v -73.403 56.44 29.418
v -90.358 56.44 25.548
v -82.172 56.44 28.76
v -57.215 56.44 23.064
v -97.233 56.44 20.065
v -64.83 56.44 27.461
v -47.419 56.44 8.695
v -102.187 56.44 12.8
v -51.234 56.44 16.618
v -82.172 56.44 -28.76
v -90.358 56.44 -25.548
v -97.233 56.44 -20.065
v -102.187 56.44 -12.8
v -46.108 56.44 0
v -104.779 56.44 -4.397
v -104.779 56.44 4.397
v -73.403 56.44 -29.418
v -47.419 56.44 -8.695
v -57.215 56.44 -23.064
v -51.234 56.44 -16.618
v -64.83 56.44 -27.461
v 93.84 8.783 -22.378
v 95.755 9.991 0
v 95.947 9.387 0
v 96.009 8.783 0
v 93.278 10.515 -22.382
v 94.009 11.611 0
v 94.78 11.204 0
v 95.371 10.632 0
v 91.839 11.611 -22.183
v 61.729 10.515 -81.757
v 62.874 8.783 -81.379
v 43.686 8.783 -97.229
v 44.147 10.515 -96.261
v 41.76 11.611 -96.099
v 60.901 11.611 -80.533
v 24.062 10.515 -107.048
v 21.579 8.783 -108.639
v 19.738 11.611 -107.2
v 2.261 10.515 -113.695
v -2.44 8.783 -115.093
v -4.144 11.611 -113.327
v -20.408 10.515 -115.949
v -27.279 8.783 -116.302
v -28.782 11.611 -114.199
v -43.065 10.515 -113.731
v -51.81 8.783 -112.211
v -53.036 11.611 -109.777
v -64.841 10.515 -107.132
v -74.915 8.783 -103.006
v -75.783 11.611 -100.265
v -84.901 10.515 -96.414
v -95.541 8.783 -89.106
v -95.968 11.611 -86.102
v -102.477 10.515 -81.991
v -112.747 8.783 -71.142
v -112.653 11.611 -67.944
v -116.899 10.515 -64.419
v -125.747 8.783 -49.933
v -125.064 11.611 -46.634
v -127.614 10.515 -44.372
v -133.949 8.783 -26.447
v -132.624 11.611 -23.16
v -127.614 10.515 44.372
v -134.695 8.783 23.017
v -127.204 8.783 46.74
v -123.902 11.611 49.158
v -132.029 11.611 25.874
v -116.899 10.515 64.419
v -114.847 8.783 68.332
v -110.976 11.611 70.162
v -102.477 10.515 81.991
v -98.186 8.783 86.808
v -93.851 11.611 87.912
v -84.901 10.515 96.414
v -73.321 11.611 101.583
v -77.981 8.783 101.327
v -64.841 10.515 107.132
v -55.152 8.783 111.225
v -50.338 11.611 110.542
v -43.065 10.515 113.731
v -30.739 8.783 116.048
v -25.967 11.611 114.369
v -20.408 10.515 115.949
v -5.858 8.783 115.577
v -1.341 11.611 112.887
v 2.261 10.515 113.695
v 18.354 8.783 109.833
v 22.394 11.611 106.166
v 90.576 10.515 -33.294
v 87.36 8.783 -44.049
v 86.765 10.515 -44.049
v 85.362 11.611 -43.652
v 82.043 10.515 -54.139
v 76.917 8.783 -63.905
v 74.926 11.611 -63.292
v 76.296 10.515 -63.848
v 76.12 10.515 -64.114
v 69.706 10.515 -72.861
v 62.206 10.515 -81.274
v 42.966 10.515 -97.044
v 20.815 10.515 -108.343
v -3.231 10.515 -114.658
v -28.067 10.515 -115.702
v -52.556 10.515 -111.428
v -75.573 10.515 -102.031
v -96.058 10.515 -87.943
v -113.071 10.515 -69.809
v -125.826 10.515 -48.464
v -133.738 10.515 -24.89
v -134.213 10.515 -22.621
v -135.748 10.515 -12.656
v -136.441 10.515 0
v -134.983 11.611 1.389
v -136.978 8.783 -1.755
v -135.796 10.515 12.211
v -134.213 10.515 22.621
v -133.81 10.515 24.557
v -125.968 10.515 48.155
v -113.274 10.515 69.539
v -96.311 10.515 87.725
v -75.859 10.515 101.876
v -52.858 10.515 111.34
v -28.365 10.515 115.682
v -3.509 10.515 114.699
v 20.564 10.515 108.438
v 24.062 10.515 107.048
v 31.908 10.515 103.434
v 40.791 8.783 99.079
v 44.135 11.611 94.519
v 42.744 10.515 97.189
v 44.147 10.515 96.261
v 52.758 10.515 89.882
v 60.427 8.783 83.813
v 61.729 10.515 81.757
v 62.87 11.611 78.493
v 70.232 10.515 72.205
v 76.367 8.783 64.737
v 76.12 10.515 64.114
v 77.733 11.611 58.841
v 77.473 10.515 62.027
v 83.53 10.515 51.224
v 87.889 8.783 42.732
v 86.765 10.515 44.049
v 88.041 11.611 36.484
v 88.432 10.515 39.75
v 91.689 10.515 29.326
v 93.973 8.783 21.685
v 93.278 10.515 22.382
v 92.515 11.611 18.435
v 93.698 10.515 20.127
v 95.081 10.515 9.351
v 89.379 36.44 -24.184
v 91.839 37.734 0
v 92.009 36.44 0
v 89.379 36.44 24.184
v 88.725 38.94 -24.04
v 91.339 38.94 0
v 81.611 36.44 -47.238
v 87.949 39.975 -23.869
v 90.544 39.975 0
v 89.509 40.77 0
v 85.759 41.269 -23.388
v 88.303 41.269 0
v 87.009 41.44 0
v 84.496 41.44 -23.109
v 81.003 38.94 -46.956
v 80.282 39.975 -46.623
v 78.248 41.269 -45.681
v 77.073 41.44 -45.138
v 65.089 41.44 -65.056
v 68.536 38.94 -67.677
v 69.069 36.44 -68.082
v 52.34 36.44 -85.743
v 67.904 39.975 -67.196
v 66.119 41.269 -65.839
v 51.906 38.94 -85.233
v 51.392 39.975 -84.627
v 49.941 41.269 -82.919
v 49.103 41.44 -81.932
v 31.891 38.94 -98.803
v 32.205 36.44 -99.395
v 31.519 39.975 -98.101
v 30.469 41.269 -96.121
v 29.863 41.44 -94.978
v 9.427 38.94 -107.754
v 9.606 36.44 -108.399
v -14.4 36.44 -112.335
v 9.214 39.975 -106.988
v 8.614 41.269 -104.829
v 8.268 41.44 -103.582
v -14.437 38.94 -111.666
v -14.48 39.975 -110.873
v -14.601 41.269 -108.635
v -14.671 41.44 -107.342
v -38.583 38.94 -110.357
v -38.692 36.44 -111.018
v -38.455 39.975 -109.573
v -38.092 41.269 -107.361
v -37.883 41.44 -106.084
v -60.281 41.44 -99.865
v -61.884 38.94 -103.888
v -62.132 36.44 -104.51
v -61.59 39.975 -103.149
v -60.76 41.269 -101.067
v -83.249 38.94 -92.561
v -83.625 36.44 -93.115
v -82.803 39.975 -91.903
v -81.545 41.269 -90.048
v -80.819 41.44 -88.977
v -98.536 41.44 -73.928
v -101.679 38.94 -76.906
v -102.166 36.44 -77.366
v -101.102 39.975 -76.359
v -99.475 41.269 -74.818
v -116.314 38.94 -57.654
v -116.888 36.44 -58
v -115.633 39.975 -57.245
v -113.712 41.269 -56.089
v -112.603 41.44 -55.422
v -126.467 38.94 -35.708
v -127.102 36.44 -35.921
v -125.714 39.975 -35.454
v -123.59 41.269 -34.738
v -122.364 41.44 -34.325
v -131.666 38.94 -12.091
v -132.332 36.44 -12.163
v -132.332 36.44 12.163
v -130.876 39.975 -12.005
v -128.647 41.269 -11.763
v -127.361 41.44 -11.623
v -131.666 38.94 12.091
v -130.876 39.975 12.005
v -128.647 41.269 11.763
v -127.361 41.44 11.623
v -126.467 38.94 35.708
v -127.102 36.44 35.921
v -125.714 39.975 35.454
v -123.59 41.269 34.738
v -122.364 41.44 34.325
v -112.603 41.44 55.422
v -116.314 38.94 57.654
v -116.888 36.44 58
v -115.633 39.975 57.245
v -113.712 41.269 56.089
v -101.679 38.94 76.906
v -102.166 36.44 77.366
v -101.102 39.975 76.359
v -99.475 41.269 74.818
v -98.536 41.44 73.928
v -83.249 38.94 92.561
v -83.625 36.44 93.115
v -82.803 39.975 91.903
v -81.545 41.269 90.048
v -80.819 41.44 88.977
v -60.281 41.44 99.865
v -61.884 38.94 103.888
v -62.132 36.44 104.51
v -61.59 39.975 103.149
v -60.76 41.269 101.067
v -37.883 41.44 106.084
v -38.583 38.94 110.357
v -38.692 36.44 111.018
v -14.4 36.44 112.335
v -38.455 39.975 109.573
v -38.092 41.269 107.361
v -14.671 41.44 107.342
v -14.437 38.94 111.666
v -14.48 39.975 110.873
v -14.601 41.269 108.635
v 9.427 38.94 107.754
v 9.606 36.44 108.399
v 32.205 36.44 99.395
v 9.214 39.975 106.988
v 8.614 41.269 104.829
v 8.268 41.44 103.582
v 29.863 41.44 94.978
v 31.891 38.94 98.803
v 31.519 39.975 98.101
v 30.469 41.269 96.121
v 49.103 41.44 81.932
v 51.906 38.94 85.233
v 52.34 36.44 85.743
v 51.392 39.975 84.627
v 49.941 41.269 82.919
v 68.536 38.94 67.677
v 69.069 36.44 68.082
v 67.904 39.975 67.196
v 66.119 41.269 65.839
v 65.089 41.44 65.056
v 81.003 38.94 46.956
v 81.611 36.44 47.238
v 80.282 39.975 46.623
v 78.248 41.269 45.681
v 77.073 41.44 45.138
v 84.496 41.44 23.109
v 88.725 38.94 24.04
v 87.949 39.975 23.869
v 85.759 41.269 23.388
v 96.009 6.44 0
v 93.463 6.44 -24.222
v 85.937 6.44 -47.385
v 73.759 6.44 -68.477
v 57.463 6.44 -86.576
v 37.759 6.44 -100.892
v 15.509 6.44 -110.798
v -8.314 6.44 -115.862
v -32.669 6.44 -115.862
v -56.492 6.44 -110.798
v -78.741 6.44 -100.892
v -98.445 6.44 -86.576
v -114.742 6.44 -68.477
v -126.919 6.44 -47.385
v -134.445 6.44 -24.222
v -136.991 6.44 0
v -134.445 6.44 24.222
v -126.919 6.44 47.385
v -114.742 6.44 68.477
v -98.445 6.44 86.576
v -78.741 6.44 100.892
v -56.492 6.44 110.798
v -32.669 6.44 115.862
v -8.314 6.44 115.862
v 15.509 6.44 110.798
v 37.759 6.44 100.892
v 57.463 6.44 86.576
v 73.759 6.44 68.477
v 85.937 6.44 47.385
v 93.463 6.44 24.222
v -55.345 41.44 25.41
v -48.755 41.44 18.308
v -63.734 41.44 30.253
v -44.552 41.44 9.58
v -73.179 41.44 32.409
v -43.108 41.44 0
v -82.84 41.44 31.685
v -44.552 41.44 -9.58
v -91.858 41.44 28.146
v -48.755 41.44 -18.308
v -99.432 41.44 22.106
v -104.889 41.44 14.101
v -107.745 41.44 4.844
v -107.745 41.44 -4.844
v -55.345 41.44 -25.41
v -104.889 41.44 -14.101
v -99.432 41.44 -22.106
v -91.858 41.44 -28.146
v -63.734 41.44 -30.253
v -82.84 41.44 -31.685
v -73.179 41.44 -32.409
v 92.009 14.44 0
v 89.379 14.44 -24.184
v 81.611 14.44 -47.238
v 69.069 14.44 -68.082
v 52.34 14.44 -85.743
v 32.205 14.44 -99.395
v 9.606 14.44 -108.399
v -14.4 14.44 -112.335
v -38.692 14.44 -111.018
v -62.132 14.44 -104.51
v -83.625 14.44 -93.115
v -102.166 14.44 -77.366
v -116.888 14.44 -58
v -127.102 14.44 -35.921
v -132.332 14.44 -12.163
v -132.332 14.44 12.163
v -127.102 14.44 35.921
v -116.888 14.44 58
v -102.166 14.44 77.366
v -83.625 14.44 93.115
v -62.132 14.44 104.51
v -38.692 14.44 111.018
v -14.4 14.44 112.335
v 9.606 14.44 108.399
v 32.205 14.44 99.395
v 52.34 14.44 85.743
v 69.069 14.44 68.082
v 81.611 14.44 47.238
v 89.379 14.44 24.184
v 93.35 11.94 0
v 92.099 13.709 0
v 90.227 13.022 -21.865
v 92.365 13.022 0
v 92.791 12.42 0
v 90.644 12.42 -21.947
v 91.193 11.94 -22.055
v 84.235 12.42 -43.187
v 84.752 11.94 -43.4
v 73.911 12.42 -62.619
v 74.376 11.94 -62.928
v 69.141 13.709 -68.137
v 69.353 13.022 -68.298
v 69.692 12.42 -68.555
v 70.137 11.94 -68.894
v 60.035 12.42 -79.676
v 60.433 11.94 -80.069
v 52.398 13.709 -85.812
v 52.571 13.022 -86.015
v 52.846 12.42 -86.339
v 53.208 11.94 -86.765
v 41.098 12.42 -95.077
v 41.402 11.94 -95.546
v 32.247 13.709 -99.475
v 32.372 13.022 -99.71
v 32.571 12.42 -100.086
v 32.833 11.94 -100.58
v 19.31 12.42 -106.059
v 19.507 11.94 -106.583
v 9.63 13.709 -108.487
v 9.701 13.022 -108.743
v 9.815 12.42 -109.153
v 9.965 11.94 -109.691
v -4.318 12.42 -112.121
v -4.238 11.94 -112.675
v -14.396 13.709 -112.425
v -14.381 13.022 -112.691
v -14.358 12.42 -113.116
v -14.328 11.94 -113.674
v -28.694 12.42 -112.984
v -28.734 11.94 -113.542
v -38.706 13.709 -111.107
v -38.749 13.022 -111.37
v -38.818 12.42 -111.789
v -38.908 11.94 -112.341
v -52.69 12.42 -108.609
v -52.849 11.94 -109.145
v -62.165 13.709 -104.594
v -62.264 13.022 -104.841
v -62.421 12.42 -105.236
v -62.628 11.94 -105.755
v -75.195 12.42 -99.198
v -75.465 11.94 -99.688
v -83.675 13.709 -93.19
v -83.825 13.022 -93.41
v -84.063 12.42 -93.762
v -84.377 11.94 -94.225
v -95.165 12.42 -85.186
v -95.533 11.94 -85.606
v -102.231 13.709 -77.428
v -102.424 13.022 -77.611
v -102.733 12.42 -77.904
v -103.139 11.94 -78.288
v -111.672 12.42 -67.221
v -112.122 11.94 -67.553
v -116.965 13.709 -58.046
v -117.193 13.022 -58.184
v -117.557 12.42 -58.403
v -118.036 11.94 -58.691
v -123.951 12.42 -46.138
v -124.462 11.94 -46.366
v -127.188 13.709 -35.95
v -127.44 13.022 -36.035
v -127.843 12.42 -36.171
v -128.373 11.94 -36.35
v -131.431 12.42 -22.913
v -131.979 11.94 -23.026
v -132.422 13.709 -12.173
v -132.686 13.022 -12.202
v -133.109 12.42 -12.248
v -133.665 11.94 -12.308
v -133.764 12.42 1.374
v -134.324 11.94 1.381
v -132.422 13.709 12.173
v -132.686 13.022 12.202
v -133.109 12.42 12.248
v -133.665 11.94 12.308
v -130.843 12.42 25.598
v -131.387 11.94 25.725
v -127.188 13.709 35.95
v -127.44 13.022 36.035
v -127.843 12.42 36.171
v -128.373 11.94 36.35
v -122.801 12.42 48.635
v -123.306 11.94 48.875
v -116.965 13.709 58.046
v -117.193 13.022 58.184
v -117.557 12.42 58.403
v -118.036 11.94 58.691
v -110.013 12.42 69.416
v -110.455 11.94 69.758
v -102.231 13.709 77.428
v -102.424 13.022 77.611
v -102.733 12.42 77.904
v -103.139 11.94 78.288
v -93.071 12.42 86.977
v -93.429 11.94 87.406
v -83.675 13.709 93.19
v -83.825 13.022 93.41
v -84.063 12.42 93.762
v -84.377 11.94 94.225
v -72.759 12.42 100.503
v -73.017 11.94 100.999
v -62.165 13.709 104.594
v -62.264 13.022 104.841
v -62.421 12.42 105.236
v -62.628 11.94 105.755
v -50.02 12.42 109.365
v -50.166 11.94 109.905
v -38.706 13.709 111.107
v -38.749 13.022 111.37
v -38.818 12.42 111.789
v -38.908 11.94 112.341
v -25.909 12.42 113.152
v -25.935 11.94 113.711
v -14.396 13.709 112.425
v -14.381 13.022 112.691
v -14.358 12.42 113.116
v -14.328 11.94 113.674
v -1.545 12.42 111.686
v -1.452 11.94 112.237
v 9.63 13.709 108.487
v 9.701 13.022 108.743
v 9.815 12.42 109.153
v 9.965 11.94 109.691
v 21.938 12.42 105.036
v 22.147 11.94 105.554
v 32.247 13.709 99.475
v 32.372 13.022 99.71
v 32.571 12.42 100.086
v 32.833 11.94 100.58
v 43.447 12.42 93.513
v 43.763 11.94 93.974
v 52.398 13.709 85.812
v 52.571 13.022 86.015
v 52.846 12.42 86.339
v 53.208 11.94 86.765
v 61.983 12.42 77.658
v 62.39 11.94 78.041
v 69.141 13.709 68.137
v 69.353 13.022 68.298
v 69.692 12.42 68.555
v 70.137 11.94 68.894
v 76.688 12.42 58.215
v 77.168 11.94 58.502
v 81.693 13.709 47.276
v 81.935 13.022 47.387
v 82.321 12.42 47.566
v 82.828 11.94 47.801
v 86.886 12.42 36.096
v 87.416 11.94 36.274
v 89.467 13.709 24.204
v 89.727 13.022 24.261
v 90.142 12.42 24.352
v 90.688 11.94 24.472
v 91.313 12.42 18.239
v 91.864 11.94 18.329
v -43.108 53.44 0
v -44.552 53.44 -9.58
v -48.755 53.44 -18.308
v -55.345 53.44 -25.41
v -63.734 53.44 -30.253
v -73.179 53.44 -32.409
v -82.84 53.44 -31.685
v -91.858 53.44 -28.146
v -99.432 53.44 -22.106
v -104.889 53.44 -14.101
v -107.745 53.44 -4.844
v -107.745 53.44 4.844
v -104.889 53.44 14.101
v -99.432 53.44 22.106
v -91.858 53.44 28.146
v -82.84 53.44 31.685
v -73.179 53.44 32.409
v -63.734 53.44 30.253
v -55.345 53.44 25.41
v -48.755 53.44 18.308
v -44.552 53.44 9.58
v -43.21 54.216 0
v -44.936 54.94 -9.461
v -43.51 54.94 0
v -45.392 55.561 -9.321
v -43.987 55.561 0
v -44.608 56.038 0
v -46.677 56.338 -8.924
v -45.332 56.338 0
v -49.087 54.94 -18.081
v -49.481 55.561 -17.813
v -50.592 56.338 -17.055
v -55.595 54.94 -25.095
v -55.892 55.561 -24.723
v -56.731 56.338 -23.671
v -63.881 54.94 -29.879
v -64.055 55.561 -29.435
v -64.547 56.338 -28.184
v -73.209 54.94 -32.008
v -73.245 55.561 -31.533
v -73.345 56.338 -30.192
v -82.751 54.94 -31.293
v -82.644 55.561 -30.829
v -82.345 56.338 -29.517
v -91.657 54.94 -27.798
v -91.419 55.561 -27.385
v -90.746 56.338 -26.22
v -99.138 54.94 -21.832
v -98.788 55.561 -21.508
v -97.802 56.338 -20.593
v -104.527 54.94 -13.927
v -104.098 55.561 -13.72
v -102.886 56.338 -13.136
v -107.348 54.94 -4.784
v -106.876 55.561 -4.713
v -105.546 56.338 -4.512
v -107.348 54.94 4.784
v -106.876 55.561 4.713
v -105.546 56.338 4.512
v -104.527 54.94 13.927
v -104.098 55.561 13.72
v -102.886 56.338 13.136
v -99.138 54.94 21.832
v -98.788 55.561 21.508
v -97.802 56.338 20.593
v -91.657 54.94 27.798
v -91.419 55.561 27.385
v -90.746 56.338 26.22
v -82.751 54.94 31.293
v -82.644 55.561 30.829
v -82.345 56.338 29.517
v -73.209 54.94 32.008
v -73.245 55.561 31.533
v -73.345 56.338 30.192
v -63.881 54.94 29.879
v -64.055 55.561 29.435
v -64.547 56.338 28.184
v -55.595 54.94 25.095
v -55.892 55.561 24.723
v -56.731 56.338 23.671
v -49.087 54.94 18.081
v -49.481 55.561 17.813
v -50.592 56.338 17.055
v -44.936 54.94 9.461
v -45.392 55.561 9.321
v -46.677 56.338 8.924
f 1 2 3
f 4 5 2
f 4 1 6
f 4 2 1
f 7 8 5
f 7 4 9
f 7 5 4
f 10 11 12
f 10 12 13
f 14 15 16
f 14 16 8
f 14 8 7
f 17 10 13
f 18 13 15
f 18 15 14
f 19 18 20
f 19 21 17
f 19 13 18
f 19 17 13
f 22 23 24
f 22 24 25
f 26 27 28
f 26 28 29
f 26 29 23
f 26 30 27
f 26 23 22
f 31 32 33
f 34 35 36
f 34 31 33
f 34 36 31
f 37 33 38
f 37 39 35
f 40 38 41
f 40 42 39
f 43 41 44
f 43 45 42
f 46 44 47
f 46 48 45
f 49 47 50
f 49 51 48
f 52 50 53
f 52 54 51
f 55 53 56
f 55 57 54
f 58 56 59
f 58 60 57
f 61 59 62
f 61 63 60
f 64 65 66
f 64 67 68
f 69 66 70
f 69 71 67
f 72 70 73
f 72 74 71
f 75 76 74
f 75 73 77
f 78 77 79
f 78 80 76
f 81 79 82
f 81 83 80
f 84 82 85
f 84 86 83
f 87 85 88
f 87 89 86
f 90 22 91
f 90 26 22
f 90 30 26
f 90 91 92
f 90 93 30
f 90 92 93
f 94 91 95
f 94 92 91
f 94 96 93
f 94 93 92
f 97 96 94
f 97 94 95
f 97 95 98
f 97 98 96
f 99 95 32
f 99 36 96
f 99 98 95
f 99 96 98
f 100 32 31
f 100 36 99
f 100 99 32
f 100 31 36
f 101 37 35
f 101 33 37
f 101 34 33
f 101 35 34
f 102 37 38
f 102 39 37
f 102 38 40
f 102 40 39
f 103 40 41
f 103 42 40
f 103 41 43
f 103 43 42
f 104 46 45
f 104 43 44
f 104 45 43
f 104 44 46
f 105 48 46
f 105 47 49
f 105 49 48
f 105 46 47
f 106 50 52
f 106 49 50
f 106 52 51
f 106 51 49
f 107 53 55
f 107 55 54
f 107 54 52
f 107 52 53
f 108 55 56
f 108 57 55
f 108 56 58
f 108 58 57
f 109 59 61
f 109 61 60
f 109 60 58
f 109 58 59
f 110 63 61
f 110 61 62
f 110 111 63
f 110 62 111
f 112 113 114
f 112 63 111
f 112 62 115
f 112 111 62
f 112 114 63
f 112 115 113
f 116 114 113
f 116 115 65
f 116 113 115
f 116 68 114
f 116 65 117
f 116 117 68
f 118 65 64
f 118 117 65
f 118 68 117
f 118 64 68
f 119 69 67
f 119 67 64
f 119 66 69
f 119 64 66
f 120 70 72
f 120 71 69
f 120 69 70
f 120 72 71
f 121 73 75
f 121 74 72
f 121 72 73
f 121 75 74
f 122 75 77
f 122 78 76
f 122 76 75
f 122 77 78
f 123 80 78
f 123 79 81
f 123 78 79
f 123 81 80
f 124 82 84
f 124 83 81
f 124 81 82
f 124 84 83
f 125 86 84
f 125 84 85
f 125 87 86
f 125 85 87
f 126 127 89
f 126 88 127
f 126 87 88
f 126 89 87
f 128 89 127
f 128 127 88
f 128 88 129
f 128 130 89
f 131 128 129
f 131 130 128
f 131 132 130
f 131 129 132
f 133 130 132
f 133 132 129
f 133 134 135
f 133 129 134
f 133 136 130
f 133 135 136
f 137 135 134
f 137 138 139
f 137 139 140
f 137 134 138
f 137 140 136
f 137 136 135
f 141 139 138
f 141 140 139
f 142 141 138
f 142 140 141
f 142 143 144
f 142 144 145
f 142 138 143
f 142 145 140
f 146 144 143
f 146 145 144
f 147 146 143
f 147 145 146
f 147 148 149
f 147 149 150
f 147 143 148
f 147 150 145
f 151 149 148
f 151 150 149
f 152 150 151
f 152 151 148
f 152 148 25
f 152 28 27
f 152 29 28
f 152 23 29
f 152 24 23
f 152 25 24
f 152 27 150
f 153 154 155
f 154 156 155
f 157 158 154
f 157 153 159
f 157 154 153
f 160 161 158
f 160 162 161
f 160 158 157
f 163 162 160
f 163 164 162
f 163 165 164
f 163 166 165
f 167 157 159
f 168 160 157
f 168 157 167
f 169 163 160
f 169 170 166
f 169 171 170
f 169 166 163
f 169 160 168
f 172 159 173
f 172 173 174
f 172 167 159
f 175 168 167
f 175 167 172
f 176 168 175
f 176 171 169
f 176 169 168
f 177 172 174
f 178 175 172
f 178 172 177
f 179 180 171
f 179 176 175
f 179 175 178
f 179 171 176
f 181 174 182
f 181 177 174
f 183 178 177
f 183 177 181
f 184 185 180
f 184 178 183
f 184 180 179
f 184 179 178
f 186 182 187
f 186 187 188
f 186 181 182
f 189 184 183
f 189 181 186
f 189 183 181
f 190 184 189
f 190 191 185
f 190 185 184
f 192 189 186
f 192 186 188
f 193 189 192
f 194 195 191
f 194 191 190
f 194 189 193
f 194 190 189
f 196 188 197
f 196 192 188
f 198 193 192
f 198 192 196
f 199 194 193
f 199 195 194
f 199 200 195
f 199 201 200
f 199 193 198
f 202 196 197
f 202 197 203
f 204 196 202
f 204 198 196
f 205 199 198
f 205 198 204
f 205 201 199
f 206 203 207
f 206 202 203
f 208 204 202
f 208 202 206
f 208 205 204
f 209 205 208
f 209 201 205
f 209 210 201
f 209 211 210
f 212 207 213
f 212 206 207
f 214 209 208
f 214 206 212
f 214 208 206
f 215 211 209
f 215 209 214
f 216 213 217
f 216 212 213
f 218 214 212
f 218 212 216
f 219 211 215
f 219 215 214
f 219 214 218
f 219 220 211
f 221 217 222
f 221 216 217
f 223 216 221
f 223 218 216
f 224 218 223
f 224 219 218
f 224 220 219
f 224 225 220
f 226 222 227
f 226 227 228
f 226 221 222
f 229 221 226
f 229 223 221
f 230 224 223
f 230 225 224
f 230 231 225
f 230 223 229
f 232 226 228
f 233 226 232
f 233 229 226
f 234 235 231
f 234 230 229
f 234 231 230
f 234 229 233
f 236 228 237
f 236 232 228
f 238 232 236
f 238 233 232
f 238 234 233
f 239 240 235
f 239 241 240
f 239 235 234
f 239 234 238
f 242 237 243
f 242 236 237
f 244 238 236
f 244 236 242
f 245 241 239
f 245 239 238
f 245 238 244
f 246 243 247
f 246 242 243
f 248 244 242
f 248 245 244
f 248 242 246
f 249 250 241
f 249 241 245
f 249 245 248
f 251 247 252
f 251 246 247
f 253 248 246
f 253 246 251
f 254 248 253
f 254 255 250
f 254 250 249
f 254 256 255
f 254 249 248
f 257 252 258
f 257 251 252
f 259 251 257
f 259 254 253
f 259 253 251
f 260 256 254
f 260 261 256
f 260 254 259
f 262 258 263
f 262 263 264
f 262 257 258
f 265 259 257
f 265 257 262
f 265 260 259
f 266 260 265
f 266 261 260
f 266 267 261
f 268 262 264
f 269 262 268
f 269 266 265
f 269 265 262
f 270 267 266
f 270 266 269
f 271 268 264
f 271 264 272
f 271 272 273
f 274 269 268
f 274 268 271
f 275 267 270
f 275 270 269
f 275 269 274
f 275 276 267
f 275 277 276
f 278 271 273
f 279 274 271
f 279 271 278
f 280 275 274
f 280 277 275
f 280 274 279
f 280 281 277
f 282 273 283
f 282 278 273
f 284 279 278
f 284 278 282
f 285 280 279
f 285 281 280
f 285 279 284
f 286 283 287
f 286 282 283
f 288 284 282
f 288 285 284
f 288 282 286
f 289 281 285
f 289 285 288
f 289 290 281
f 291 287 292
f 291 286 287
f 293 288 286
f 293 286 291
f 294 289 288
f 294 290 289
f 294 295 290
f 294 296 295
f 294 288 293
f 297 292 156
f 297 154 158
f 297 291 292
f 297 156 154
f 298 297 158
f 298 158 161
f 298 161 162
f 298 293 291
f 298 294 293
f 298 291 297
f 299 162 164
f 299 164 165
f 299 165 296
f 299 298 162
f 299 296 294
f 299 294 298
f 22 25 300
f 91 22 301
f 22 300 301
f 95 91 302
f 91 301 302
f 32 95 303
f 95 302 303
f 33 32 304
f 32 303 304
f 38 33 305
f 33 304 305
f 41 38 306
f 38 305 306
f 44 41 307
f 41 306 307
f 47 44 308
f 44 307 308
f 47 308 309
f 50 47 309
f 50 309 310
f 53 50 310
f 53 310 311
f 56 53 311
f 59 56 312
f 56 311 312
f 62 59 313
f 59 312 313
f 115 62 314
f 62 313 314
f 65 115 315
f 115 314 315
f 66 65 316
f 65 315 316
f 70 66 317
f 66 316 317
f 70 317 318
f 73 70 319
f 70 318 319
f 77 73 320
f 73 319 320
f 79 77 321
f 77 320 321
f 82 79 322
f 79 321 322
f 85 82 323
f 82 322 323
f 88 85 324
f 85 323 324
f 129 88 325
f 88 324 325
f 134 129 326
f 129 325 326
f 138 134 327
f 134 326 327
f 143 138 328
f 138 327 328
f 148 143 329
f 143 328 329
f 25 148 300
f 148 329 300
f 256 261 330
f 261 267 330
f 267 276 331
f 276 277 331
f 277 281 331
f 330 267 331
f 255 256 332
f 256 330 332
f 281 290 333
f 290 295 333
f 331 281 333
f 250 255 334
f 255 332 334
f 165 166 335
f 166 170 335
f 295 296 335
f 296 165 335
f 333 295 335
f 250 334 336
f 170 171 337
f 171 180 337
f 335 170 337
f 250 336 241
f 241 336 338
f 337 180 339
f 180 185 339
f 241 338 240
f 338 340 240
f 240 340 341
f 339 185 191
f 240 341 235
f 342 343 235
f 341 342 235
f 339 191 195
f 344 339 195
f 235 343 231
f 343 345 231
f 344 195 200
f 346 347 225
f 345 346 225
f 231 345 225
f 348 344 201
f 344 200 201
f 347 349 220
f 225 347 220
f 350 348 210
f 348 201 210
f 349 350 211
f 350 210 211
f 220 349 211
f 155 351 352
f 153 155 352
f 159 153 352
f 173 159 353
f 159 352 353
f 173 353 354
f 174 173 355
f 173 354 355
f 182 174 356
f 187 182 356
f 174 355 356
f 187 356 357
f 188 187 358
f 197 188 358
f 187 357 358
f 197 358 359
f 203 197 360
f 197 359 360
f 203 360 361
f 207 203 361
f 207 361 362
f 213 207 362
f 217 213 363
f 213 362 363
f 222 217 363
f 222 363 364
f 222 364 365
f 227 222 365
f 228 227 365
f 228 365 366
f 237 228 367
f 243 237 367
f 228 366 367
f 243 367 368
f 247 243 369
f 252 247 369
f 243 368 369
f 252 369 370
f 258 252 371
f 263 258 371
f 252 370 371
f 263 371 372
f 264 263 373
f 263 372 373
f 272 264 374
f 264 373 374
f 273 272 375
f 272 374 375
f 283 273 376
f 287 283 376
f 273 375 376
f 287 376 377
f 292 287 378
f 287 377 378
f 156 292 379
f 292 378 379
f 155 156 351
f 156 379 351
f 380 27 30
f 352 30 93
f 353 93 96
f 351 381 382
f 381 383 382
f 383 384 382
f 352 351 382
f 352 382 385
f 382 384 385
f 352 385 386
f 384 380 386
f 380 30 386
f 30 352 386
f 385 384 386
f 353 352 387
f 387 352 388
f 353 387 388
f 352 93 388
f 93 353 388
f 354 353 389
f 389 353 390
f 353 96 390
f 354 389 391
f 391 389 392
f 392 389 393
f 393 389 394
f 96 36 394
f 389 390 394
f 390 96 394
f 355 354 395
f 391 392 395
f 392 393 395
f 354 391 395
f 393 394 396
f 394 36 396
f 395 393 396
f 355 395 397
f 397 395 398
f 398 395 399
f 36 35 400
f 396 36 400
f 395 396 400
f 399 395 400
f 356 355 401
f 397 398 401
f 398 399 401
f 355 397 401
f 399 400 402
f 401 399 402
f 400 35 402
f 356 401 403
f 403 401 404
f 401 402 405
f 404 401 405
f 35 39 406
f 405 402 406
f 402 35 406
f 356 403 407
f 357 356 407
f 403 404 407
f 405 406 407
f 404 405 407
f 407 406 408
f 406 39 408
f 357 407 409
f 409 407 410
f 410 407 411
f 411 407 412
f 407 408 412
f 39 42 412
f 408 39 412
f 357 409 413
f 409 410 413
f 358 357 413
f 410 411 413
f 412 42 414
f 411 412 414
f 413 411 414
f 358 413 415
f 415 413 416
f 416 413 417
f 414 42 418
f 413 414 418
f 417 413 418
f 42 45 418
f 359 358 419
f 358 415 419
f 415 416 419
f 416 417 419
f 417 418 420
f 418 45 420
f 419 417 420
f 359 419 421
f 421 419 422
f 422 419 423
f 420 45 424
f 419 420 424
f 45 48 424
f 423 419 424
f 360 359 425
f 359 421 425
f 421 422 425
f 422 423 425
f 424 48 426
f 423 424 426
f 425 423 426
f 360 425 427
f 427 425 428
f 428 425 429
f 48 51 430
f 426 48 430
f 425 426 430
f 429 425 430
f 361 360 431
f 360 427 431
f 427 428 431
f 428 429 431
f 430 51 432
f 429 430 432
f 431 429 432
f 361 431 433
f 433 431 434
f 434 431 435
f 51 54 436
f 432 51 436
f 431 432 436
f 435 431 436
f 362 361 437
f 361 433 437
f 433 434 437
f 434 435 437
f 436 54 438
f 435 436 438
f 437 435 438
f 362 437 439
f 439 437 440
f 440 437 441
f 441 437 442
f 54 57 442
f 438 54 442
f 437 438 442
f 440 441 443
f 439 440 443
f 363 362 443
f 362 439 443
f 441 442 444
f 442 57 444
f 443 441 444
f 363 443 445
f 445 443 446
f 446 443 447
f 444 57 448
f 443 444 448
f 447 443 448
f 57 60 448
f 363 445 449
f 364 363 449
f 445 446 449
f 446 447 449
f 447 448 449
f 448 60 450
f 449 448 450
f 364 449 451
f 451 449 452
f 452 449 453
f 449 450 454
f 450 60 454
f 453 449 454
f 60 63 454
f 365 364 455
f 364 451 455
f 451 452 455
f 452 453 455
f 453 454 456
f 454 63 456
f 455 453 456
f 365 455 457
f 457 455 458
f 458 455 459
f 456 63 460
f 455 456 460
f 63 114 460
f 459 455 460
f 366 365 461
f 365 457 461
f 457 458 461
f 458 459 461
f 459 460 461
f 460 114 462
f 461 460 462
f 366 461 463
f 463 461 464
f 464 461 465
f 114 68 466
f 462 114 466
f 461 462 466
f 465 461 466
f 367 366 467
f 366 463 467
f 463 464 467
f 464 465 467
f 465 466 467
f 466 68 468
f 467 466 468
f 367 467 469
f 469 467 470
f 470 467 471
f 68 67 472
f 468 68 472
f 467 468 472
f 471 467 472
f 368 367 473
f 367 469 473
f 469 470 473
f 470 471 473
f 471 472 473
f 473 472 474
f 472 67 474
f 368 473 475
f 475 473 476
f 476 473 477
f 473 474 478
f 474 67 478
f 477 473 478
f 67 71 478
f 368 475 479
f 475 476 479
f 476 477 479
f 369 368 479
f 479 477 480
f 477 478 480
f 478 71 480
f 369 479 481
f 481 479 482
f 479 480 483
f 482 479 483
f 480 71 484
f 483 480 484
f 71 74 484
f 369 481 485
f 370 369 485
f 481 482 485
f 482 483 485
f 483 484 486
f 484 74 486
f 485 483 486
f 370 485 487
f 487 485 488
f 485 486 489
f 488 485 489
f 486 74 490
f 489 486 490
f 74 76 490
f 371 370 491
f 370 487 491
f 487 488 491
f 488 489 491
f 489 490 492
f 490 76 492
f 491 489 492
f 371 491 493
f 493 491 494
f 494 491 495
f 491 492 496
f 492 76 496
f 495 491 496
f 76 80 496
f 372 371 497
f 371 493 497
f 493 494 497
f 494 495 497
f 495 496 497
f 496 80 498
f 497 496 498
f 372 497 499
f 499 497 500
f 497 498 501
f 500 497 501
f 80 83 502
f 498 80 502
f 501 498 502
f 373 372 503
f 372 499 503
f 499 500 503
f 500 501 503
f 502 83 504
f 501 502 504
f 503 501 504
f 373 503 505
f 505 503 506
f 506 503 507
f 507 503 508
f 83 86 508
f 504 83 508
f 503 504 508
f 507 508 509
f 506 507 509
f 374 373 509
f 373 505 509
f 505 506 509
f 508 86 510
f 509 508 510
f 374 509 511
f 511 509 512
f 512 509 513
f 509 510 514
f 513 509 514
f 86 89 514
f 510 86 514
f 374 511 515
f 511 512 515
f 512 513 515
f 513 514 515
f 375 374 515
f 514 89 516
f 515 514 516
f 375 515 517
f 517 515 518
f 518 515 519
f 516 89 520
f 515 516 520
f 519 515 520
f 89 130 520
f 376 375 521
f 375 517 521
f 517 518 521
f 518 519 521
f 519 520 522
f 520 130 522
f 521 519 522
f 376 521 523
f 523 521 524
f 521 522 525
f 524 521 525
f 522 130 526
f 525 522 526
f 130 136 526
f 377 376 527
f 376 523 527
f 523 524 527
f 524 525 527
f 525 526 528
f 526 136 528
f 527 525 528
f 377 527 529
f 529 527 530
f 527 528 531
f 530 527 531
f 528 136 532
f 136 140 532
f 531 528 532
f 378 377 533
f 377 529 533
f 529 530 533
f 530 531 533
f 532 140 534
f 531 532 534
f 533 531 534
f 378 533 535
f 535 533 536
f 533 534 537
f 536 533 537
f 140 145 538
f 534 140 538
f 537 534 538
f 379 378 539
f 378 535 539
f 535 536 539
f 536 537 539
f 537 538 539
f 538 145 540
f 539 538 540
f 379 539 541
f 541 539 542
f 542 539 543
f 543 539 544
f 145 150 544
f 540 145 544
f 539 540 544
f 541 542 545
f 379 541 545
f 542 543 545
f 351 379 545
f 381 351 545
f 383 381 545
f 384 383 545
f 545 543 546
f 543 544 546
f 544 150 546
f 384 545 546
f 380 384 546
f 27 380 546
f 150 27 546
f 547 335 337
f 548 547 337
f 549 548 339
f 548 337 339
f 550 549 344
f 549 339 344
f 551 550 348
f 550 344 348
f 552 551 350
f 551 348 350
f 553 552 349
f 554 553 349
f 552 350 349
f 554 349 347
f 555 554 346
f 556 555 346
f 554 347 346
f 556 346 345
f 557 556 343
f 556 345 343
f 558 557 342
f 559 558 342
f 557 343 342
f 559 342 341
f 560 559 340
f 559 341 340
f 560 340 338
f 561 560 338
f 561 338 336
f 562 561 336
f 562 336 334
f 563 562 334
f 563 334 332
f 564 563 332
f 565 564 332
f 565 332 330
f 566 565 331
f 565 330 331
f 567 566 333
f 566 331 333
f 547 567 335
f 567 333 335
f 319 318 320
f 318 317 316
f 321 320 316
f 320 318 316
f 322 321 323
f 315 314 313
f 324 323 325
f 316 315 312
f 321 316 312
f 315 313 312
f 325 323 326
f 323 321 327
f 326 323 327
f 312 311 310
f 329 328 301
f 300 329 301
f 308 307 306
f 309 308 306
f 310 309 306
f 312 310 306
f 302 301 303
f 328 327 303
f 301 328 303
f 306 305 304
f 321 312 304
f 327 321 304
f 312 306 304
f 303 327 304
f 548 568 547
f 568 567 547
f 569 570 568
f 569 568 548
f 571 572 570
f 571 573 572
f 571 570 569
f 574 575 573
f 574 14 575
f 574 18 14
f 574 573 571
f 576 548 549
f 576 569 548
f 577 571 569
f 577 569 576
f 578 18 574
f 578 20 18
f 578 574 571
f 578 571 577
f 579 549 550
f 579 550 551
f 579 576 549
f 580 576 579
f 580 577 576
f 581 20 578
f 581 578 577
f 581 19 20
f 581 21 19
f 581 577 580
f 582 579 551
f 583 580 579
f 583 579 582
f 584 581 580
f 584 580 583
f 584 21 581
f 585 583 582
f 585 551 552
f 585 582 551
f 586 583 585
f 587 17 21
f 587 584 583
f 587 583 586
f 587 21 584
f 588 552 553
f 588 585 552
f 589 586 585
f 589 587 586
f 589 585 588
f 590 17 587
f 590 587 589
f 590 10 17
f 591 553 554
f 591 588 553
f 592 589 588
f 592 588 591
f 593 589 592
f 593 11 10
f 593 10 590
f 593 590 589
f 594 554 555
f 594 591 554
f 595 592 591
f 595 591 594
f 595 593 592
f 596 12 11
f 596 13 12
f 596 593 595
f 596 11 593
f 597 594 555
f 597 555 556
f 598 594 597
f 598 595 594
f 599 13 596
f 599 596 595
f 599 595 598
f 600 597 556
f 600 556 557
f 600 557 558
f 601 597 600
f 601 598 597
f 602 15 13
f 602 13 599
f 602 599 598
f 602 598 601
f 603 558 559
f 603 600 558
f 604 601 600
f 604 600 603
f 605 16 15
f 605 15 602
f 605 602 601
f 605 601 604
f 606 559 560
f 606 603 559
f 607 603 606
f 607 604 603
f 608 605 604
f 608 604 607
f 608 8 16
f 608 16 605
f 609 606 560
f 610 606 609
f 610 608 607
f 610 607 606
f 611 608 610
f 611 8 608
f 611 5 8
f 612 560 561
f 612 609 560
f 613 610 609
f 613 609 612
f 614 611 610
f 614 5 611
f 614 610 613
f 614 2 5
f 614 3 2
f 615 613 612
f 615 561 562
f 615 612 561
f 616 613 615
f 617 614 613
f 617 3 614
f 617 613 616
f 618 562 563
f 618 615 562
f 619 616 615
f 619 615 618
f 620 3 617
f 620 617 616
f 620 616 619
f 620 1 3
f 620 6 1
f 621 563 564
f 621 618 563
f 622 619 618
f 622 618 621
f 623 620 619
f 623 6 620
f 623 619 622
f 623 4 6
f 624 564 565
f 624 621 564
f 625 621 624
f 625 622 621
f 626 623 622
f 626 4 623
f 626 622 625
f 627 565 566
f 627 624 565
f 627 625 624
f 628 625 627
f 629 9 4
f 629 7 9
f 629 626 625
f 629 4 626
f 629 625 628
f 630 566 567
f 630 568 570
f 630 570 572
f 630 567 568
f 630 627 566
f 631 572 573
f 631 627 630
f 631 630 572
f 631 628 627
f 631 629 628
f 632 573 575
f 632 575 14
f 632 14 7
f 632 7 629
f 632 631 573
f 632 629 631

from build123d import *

# Parameters (mm, degrees)
FILLET2_R           = 3
FILLET3_R           = 3
FILLET4_R           = 5
SKETCH4_R           = 32.5
BOSS_EXTRUDE3_DEPTH = 15
FILLET6_R           = 3


with BuildPart() as part:
    # Sketch1 → Revolve1 (revolve)
    with BuildSketch(Plane.XY):
        Polygon((-20.491071429, 41.439732143), (92.008928571, 41.439732143), (92.008928571, 11.439732143), (96.008928571, 11.439732143), (96.008928571, 6.439732143), (-20.491071429, 6.439732143), align=None)
    revolve(axis=Axis((-20.491071429, 6.439732143, 0), (0, 1, 0)))

    # Fillet2
    fillet2_edges = [part.edges().sort_by_distance(p)[0] for p in [
        (-132.991071429, 11.439732143, 0),
    ]]
    fillet(fillet2_edges, radius=FILLET2_R)

    # Fillet3
    fillet3_edges = [part.edges().sort_by_distance(p)[0] for p in [
        (-136.991071429, 11.439732143, 0),
    ]]
    fillet(fillet3_edges, radius=FILLET3_R)

    # Fillet4
    fillet4_edges = [part.edges().sort_by_distance(p)[0] for p in [
        (-132.991071429, 41.439732143, 0),
    ]]
    fillet(fillet4_edges, radius=FILLET4_R)

    # Sketch4 → Boss-Extrude3 (add)
    with BuildSketch(Plane(origin=(0, 41.439732143, 0), x_dir=(1, 0, 0), z_dir=(0, 1, 0))):
        with Locations((-75.608010417, 0)):
            Circle(SKETCH4_R)
    extrude(amount=BOSS_EXTRUDE3_DEPTH)

    # Fillet6
    fillet6_edges = [part.edges().sort_by_distance(p)[0] for p in [
        (-108.108010417, 56.439732143, 0),
    ]]
    fillet(fillet6_edges, radius=FILLET6_R)


solid = part.part
